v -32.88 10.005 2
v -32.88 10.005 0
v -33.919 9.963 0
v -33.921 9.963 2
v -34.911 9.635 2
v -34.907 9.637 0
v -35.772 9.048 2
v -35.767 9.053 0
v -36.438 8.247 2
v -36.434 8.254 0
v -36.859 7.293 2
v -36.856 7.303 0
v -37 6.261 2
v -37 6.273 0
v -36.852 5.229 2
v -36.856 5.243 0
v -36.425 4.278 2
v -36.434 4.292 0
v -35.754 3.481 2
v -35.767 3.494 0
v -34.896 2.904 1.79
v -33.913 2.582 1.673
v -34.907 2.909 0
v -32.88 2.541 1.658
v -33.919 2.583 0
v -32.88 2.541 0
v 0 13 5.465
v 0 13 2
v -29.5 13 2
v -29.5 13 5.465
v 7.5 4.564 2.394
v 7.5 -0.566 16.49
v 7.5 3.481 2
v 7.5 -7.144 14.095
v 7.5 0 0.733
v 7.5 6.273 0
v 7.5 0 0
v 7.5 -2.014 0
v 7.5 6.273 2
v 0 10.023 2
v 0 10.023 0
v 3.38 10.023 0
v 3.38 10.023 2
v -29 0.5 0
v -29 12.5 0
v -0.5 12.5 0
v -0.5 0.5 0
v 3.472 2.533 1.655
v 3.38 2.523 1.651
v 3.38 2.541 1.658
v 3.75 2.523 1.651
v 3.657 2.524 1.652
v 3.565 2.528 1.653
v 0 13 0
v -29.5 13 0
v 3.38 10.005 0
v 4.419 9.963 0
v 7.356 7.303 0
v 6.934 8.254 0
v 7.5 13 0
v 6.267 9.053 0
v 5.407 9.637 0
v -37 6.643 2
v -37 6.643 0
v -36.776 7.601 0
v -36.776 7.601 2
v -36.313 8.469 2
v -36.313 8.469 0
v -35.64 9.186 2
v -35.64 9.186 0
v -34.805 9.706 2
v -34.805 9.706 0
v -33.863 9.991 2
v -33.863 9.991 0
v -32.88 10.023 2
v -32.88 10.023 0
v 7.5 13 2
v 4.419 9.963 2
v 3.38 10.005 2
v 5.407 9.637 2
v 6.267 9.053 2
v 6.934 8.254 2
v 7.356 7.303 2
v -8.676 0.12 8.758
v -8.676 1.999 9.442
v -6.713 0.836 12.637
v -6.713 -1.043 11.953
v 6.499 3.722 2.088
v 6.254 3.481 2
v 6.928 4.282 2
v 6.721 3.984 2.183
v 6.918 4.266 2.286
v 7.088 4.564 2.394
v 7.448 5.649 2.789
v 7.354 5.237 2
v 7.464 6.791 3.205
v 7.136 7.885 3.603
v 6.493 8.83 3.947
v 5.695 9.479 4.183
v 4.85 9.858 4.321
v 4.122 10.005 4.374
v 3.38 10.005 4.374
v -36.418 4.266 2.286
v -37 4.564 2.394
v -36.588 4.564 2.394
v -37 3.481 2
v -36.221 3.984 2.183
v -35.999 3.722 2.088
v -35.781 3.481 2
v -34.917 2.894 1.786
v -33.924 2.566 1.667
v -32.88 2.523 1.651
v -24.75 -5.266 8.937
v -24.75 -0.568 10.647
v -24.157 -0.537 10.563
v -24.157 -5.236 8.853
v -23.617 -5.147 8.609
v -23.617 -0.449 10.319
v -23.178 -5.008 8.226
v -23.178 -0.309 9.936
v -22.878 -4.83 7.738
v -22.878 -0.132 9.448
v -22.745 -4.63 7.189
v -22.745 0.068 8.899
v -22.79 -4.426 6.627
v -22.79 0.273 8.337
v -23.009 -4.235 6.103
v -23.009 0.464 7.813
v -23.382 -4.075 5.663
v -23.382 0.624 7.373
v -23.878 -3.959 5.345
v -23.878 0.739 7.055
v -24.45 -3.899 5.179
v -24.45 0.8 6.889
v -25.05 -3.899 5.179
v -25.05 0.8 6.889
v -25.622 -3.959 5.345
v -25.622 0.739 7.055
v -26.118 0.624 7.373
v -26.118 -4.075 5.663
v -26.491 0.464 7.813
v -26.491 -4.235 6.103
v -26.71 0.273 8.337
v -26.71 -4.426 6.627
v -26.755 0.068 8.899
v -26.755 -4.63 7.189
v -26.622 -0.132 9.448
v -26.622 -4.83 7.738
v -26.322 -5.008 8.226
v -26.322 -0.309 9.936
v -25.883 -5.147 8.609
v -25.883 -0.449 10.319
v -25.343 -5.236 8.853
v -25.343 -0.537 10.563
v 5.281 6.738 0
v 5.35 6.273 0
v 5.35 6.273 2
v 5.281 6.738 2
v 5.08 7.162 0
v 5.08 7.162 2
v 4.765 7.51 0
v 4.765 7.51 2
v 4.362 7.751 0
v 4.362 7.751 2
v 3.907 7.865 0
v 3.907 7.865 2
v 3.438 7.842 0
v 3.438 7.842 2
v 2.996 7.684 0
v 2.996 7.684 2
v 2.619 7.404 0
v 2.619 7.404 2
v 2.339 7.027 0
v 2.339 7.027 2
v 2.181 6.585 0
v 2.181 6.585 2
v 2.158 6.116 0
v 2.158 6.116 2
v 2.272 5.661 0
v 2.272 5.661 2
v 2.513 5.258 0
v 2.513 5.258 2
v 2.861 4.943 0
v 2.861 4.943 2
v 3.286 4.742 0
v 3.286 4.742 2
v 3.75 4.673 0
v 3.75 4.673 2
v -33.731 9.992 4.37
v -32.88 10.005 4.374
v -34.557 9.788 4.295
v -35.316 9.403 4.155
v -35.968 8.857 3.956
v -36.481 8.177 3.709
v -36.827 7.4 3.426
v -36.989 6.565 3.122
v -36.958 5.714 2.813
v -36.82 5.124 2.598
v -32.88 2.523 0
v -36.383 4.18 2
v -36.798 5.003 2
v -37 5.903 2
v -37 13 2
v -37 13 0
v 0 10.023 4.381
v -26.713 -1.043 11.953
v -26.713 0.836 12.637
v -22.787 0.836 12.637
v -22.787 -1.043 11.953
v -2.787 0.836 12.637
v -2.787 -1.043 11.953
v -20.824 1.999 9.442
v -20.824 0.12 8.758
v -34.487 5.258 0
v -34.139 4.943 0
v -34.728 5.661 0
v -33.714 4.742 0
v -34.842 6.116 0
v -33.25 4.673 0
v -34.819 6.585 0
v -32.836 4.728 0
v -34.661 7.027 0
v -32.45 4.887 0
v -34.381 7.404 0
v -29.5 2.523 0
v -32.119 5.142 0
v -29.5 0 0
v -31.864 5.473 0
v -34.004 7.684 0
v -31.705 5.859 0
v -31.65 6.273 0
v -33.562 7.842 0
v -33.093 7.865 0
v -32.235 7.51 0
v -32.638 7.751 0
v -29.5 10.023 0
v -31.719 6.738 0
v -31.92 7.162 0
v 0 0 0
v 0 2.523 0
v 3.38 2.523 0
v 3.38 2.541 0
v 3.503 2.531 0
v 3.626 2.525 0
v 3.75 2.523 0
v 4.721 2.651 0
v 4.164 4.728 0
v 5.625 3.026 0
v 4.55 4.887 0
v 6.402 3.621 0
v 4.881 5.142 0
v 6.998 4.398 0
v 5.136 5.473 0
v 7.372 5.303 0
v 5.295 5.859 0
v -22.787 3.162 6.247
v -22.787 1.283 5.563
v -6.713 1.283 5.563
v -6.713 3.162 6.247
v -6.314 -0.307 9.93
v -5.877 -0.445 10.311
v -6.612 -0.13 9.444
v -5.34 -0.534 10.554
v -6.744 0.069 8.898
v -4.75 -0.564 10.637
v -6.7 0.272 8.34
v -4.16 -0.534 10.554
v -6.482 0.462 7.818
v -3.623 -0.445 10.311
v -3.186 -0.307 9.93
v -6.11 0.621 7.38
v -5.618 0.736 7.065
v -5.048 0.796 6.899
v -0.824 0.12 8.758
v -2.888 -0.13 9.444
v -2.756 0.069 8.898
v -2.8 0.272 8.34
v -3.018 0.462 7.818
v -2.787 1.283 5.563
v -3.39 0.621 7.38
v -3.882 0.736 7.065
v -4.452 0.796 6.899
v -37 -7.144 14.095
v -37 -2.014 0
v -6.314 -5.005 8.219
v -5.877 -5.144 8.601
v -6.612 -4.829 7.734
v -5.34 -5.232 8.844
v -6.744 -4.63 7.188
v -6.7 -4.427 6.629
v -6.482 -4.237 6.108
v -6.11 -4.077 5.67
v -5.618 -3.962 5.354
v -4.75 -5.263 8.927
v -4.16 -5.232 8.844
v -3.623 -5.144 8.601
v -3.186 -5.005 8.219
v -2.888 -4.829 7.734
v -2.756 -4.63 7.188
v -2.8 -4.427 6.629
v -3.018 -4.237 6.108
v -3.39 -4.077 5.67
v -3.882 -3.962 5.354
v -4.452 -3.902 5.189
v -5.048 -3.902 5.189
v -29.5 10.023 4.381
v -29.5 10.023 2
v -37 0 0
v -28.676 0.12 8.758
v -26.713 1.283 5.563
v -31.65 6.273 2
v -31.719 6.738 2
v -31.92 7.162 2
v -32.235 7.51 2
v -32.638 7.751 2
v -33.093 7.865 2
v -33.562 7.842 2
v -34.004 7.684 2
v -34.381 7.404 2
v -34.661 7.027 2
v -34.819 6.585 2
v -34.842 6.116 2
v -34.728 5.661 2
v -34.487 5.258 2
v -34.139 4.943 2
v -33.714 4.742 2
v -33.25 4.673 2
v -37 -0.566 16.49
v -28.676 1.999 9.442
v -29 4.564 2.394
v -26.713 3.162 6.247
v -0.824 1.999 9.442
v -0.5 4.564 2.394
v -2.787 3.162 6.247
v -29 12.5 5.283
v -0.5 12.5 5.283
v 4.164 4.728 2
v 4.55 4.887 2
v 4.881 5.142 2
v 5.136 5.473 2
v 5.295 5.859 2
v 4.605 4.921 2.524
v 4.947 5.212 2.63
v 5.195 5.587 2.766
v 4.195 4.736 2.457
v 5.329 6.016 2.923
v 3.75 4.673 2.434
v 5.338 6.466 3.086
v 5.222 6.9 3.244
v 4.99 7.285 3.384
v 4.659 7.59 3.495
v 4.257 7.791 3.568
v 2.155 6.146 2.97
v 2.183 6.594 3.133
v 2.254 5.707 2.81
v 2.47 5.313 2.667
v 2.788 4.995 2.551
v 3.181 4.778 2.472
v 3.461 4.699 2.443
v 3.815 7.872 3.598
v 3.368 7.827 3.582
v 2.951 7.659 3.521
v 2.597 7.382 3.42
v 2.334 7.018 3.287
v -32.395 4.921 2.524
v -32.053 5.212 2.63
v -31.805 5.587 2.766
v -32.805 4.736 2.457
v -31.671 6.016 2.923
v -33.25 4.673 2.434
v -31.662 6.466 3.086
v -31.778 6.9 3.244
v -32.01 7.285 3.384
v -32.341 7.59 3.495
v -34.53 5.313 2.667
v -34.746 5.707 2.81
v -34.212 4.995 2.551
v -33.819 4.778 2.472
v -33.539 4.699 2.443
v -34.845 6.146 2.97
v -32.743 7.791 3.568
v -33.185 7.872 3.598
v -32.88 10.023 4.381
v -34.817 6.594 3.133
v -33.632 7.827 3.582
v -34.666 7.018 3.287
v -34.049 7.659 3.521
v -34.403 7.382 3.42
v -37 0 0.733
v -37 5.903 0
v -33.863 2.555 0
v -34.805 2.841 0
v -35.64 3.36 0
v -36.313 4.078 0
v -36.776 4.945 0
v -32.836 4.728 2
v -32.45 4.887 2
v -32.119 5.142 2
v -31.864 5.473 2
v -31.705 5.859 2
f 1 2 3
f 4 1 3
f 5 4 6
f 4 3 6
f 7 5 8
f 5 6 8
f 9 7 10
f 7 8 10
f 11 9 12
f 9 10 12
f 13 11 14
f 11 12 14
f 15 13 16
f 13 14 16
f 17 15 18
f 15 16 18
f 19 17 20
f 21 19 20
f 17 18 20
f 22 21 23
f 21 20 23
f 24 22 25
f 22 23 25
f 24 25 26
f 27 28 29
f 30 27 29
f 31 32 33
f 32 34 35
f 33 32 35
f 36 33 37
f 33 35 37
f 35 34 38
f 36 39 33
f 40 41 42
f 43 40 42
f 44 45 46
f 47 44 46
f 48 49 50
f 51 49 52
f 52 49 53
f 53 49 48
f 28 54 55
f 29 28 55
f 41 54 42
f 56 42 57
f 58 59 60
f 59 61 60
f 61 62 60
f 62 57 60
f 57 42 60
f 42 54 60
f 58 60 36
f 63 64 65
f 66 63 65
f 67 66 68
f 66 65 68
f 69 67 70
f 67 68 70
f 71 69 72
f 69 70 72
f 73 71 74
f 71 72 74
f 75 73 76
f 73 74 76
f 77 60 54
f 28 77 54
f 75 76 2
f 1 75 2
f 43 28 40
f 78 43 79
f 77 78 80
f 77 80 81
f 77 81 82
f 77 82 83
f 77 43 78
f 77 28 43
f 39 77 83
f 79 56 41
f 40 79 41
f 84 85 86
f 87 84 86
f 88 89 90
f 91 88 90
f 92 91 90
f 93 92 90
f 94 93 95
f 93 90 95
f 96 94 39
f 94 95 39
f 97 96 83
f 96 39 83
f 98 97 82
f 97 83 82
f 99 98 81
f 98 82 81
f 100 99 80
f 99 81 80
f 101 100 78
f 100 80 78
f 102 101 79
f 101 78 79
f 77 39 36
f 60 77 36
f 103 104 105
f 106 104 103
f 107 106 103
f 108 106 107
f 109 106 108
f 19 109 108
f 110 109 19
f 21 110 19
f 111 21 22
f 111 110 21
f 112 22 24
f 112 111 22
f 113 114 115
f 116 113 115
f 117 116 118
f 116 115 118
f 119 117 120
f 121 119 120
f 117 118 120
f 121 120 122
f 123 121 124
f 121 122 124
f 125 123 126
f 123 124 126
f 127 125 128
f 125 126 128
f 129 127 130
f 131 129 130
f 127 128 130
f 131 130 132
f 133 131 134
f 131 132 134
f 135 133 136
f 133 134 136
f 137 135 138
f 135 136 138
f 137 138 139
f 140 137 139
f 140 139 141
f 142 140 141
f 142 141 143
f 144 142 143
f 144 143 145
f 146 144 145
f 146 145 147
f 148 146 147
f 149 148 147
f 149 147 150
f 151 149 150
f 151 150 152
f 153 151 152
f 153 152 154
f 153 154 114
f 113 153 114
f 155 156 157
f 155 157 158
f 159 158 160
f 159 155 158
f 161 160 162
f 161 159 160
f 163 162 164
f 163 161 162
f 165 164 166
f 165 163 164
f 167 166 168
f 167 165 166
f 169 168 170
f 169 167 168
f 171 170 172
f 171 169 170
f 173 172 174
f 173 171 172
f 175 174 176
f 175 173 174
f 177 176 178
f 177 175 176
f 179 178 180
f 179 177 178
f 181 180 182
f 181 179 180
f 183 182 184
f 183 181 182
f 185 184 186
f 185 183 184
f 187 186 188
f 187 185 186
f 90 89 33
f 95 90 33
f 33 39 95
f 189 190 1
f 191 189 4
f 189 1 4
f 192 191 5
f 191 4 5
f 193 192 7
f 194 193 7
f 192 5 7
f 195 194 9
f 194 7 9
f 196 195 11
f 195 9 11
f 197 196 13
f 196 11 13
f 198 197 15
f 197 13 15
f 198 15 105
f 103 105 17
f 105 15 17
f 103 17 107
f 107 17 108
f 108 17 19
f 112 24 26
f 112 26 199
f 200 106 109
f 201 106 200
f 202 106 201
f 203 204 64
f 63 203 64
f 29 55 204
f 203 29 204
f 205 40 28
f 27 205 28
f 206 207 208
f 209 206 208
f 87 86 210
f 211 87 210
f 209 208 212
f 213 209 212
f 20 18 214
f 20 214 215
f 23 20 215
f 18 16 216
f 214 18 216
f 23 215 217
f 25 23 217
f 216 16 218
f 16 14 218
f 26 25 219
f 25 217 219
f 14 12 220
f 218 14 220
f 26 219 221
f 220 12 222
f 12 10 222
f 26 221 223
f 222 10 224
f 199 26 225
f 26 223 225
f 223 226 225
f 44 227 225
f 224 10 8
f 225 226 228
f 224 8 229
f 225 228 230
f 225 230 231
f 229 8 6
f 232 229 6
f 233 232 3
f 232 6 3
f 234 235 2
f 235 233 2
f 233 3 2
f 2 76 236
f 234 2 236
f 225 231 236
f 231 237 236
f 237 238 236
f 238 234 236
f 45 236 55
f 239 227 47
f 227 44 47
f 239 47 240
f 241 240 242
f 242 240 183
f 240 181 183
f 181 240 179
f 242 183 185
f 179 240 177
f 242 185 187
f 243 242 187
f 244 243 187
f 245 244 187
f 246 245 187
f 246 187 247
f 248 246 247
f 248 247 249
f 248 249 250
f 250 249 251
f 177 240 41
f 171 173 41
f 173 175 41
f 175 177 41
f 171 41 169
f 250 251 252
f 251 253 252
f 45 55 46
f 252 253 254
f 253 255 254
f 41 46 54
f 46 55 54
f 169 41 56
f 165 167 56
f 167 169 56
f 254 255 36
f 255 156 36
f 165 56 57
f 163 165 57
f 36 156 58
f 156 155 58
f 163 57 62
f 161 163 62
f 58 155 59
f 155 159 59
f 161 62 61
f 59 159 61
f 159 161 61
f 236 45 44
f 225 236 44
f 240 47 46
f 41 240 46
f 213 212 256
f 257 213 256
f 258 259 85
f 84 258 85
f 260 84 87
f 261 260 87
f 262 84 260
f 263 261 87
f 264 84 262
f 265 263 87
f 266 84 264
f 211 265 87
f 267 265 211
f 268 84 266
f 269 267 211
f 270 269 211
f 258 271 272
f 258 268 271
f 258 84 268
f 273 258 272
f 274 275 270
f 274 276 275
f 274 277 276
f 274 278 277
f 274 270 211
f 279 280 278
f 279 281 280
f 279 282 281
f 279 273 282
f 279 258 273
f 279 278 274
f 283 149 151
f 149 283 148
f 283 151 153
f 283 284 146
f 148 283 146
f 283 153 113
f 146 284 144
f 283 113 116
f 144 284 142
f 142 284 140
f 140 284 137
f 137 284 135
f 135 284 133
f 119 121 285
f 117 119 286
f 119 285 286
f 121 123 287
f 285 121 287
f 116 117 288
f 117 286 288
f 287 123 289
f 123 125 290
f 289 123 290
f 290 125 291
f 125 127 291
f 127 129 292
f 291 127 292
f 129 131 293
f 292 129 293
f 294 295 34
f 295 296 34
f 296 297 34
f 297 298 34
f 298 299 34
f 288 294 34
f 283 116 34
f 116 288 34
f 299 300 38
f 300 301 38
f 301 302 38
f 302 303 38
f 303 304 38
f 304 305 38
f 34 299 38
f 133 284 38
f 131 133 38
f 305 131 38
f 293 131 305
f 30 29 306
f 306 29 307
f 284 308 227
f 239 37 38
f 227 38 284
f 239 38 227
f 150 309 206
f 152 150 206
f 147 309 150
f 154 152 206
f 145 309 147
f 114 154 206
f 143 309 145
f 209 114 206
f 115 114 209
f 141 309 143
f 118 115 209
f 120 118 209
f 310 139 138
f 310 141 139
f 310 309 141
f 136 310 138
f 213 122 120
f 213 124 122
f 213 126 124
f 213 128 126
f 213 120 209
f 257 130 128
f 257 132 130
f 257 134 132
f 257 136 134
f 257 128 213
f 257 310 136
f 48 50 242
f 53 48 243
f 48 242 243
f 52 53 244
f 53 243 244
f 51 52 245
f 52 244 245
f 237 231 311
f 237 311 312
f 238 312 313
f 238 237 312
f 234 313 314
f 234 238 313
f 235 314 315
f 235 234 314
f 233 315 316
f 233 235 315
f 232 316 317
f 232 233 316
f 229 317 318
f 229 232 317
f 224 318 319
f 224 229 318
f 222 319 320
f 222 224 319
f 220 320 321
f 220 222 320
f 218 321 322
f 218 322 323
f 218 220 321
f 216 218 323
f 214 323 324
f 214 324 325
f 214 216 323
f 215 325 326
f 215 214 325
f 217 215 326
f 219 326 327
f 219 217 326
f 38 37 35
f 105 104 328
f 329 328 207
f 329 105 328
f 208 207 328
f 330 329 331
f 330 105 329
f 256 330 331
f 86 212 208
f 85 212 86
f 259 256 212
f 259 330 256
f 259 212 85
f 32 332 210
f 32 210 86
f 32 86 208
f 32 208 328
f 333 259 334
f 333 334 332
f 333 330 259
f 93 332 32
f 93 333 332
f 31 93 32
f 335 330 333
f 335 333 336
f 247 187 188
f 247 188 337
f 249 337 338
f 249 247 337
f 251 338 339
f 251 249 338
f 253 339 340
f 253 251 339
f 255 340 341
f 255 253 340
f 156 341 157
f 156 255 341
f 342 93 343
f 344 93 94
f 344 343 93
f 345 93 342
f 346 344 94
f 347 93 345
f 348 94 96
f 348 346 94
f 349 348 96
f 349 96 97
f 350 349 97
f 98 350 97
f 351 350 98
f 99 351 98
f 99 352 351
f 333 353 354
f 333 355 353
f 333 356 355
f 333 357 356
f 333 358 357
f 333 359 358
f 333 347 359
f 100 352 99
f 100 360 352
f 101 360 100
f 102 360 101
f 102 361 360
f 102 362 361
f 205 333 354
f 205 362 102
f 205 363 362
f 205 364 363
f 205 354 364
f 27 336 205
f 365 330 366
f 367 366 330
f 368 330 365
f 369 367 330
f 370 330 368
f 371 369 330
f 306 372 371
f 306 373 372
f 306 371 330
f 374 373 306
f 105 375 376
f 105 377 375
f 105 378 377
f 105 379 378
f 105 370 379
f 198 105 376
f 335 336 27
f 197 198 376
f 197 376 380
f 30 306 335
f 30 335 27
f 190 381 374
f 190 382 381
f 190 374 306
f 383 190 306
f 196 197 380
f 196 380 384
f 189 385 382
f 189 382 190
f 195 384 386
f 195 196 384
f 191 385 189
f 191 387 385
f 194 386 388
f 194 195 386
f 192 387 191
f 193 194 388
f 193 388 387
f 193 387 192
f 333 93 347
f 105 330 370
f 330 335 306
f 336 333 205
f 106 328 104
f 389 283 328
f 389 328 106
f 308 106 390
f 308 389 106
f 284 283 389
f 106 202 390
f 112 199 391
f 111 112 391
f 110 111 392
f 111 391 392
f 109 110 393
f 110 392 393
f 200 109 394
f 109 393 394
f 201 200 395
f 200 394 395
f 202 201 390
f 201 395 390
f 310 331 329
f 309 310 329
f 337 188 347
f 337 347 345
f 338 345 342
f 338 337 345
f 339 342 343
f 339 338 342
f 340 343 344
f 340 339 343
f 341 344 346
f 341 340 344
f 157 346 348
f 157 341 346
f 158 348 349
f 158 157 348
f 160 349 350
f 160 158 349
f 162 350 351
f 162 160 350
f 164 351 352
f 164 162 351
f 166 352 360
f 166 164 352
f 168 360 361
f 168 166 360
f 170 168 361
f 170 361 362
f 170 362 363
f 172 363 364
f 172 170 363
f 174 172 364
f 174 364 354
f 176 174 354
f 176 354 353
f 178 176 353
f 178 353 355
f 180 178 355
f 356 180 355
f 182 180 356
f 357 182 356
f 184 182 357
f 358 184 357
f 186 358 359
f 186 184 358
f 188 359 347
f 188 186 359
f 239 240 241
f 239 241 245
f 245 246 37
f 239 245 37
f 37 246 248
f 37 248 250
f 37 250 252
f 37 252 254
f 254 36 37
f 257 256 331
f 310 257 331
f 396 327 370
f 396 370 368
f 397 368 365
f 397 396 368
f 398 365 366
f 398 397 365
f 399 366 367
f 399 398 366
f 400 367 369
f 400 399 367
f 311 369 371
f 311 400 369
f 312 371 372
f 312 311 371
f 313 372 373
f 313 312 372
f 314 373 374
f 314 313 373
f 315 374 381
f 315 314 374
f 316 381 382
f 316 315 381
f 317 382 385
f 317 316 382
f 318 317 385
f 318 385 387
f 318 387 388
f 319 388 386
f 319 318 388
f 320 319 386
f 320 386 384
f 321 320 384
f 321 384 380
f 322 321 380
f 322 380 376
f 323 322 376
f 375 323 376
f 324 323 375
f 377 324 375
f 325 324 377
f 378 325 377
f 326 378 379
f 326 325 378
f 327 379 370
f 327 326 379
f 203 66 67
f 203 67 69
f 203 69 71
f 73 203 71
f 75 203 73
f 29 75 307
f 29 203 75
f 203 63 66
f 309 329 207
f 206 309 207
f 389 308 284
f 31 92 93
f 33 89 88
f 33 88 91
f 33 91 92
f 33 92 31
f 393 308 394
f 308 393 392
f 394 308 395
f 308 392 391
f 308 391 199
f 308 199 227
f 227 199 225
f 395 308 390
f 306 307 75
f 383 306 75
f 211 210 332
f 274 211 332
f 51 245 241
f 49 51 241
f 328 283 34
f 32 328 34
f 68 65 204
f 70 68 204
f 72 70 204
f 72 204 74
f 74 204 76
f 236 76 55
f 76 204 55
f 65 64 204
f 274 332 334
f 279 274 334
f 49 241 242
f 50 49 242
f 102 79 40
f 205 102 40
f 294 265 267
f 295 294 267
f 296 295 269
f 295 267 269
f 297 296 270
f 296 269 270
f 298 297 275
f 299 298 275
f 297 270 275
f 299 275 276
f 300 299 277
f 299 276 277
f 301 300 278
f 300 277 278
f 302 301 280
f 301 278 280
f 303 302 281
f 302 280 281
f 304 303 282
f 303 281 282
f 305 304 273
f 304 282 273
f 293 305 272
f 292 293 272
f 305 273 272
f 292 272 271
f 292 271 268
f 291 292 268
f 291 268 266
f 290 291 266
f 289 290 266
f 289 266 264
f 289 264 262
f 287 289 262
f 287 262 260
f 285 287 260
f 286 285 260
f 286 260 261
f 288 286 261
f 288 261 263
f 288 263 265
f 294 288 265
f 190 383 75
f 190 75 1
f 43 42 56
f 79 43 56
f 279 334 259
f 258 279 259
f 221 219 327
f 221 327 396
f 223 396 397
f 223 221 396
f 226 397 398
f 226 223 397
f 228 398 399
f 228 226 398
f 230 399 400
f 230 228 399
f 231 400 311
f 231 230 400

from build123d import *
from build123d.topology import SkipClean

# Parameters (mm, degrees)
SKETCH2_R           = 1.6
SKETCH2_W           = 28.5
SKETCH2_H           = 12
BOSS_EXTRUDE1_DEPTH = 2
SKETCH3_W           = 44.5
SKETCH3_H           = 15
BOSS_EXTRUDE2_DEPTH = 7
BOSS_EXTRUDE3_REACH = 44.543
SKETCH2_3_R         = 1.6
SKETCH2_3_W         = 28.5
SKETCH2_3_H         = 12
SKETCH4_R           = 2.010738951
SKETCH4_R_2         = 2
CUT_EXTRUDE1_DEPTH  = 2
SKETCH4_2_R         = 2
SKETCH4_2_R_2       = 2.010738951
CUT_EXTRUDE2_DEPTH  = 42.581180746
BOSS_EXTRUDE4_DEPTH = 44.5


with BuildPart() as part:
    # Sketch2 → Boss-Extrude1 (new body)
    # profile 1 of 6: a face of its own
    with BuildSketch(Plane.XY):
        with BuildLine():
            ThreePointArc((3.38, 10.004825556), (6.267439172, 9.052511956), (7.5, 6.27312354))
            Line((7.5, 6.27312354), (7.5, 13))
            Line((7.5, 13), (0, 13))
            Line((0, 13), (0, 10.023123532))
            Line((0, 10.023123532), (3.38, 10.023123532))
            Line((3.38, 10.023123532), (3.38, 10.004825556))
        make_face()
    # profile 2 of 6: a face of its own
    with BuildSketch(Plane.XY):
        with BuildLine():
            Line((3.38, 2.523123532), (0, 2.523123532))
            Line((0, 2.523123532), (0, 0))
            Line((0, 0), (7.5, 0))
            Line((7.5, 0), (7.5, 6.27312354))
            ThreePointArc((7.5, 6.27312354), (6.401650432, 3.621473105), (3.75, 2.523123532))
            Line((3.75, 2.523123532), (3.725156678, 2.523123532))
            Line((3.725156678, 2.523123532), (3.38, 2.523123532))
        make_face()
    # profile 3 of 6: a face of its own
    with BuildSketch(Plane.XY):
        with BuildLine():
            Line((-37, 13), (-37, 6.643123532))
            ThreePointArc((-37, 6.643123532), (-35.64002092, 9.18640347), (-32.88, 10.023123532))
            Line((-32.88, 10.023123532), (-29.5, 10.023123532))
            Line((-29.5, 10.023123532), (-29.5, 13))
            Line((-29.5, 13), (-37, 13))
        make_face()
    # profile 4 of 6: a face of its own
    with BuildSketch(Plane.XY):
        with BuildLine():
            Line((-37, 0), (-29.5, 0))
            Line((-29.5, 0), (-29.5, 2.523123532))
            Line((-29.5, 2.523123532), (-32.88, 2.523123532))
            ThreePointArc((-32.88, 2.523123532), (-35.64002092, 3.359843593), (-37, 5.903123532))
            Line((-37, 5.903123532), (-37, 0))
        make_face()
    # profile 5 of 6: a face of its own
    with BuildSketch(Plane.XY):
        with BuildLine():
            Line((3.38, 10.004825556), (0, 10.023123532))
            Line((0, 10.023123532), (0, 13))
            Line((0, 13), (-29.5, 13))
            Line((-29.5, 13), (-29.5, 10.023123532))
            Line((-29.5, 10.023123532), (-32.88, 10.023123532))
            Line((-32.88, 10.023123532), (-32.88, 10.004825556))
            ThreePointArc((-32.88, 10.004825556), (-37, 6.273123532), (-32.88, 2.541421507))
            Line((-32.88, 2.541421507), (-32.88, 2.523123532))
            Line((-32.88, 2.523123532), (-29.5, 2.523123532))
            Line((-29.5, 2.523123532), (-29.5, 0))
            Line((-29.5, 0), (0, 0))
            Line((0, 0), (0, 2.523123532))
            Line((0, 2.523123532), (3.38, 2.523123532))
            Line((3.38, 2.523123532), (3.38, 2.541421507))
            ThreePointArc((3.38, 2.541421507), (7.5, 6.273123532), (3.38, 10.004825556))
        make_face()
        with Locations((3.75, 6.273123532)):
            Circle(SKETCH2_R, mode=Mode.SUBTRACT)
        with Locations((-33.25, 6.273123532)):
            Circle(SKETCH2_R, mode=Mode.SUBTRACT)
        with Locations((-14.75, 6.5)):
            Rectangle(SKETCH2_W, SKETCH2_H, mode=Mode.SUBTRACT)
    # profile 6 of 6: a face of its own
    with BuildSketch(Plane.XY):
        with Locations((-14.75, 6.5)):
            Rectangle(SKETCH2_W, SKETCH2_H)
    extrude(amount=BOSS_EXTRUDE1_DEPTH)

    # Sketch3 → Boss-Extrude2 (add)
    with BuildSketch(Plane(origin=(0, -1.778051923, -0.647157975), x_dir=(1, 0, 0), z_dir=(-1.5523980964466968e-15, 0.9396926207859094, 0.34202014332566594))):
        with Locations((-14.75, -8.188691132)):
            Rectangle(SKETCH3_W, SKETCH3_H)
    extrude(amount=BOSS_EXTRUDE2_DEPTH)

    # Boss-Extrude3: up to this plane
    with SkipClean():  # the faces are left unmerged after this step: merging them gives an invalid solid
        boss_extrude3_end = Plane(origin=(-37, 4.564250183, 2.394141003), z_dir=(0, -0.34202014332566594, 0.9396926207859094))
        # Sketch2<3> → Boss-Extrude3 (add, up to the surface)
        with BuildSketch(Plane.XY, mode=Mode.PRIVATE) as boss_extrude3_sk1:
            with BuildLine():
                Line((3.38, 10.004825556), (0, 10.023123532))
                Line((0, 10.023123532), (0, 13))
                Line((0, 13), (-29.5, 13))
                Line((-29.5, 13), (-29.5, 10.023123532))
                Line((-29.5, 10.023123532), (-32.88, 10.023123532))
                Line((-32.88, 10.023123532), (-32.88, 10.004825556))
                ThreePointArc((-32.88, 10.004825556), (-37, 6.273123532), (-32.88, 2.541421507))
                Line((-32.88, 2.541421507), (-32.88, 2.523123532))
                Line((-32.88, 2.523123532), (-29.5, 2.523123532))
                Line((-29.5, 2.523123532), (-29.5, 0))
                Line((-29.5, 0), (0, 0))
                Line((0, 0), (0, 2.523123532))
                Line((0, 2.523123532), (3.38, 2.523123532))
                Line((3.38, 2.523123532), (3.38, 2.541421507))
                ThreePointArc((3.38, 2.541421507), (7.5, 6.273123532), (3.38, 10.004825556))
            make_face()
            with Locations(Location((3.75, 6.273123532, 0), (0, 0, 270))):
                Circle(SKETCH2_3_R, mode=Mode.SUBTRACT)
            with Locations(Location((-33.25, 6.273123532, 0), (0, 0, 270))):
                Circle(SKETCH2_3_R, mode=Mode.SUBTRACT)
            with Locations((-14.75, 6.5)):
                Rectangle(SKETCH2_3_W, SKETCH2_3_H, mode=Mode.SUBTRACT)
        boss_extrude3_tool1 = split(extrude(boss_extrude3_sk1.sketch, amount=BOSS_EXTRUDE3_REACH, mode=Mode.PRIVATE), bisect_by=boss_extrude3_end, keep=Keep.BOTH, mode=Mode.PRIVATE)
        add(boss_extrude3_tool1.solids().sort_by_distance((1.68749, 9.550381, 0))[0])
        # Sketch2<3> → Boss-Extrude3 (add, up to the surface)
        with BuildSketch(Plane.XY, mode=Mode.PRIVATE) as boss_extrude3_sk2:
            with Locations((-14.75, 6.5)):
                Rectangle(SKETCH2_3_W, SKETCH2_3_H)
        boss_extrude3_tool2 = split(extrude(boss_extrude3_sk2.sketch, amount=BOSS_EXTRUDE3_REACH, mode=Mode.PRIVATE), bisect_by=boss_extrude3_end, keep=Keep.BOTH, mode=Mode.PRIVATE)
        add(boss_extrude3_tool2.solids().sort_by_distance((-14.75, 6.5, 0))[0])

    # Sketch4 → Cut-Extrude1 (cut)
    # profile 1 of 2: a face of its own
    with SkipClean():  # the faces are left unmerged after this step: merging them gives an invalid solid
        with BuildSketch(Plane(origin=(0, 4.799796423, 1.746983028), x_dir=(1, 0, 0), z_dir=(-1.5524032942846936e-15, 0.9396926207859094, 0.34202014332566594))):
            Polygon((-28.67598183, -8.188691132), (-26.712990915, -11.588691132), (-22.787009085, -11.588691132), (-20.82401817, -8.188691132), (-22.787009085, -4.788691132), (-26.712990915, -4.788691132), align=None)
            with Locations(Location((-24.75, -8.188691132, 0), (0, 0, 270))):
                Circle(SKETCH4_R, mode=Mode.SUBTRACT)
        # profile 2 of 2: a face of its own
        with BuildSketch(Plane(origin=(0, 4.799796423, 1.746983028), x_dir=(1, 0, 0), z_dir=(-1.5524032942846936e-15, 0.9396926207859094, 0.34202014332566594))):
            Polygon((-8.67598183, -8.188691132), (-6.712990915, -11.588691132), (-2.787009085, -11.588691132), (-0.82401817, -8.188691132), (-2.787009085, -4.788691132), (-6.712990915, -4.788691132), align=None)
            with Locations(Location((-4.75, -8.188691132, 0), (0, 0, 270))):
                Circle(SKETCH4_R_2, mode=Mode.SUBTRACT)
        extrude(amount=-CUT_EXTRUDE1_DEPTH, mode=Mode.SUBTRACT)

    # Sketch4<2> → Cut-Extrude2 (cut, through all)
    with SkipClean():  # the faces are left unmerged after this step: merging them gives an invalid solid
        with BuildSketch(Plane(origin=(0, 4.799796423, 1.746983028), x_dir=(1, 0, 0), z_dir=(-1.5524032942846936e-15, 0.9396926207859094, 0.34202014332566594))):
            with Locations(Location((-4.75, -8.188691132, 0), (0, 0, 270))):
                Circle(SKETCH4_2_R)
            with Locations(Location((-24.75, -8.188691132, 0), (0, 0, 270))):
                Circle(SKETCH4_2_R_2)
        extrude(amount=-CUT_EXTRUDE2_DEPTH, mode=Mode.SUBTRACT)

    # Sketch5 → Boss-Extrude4 (add)
    with SkipClean():  # the faces are left unmerged after this step: merging them gives an invalid solid
        with BuildSketch(Plane(origin=(7.5, 0, 0), x_dir=(0, 0, -1), z_dir=(1, 0, 0))):
            Polygon((-0.732889795, 0), (0, 0), (0, -2.013598163), align=None)
        extrude(amount=-BOSS_EXTRUDE4_DEPTH)


solid = part.part
